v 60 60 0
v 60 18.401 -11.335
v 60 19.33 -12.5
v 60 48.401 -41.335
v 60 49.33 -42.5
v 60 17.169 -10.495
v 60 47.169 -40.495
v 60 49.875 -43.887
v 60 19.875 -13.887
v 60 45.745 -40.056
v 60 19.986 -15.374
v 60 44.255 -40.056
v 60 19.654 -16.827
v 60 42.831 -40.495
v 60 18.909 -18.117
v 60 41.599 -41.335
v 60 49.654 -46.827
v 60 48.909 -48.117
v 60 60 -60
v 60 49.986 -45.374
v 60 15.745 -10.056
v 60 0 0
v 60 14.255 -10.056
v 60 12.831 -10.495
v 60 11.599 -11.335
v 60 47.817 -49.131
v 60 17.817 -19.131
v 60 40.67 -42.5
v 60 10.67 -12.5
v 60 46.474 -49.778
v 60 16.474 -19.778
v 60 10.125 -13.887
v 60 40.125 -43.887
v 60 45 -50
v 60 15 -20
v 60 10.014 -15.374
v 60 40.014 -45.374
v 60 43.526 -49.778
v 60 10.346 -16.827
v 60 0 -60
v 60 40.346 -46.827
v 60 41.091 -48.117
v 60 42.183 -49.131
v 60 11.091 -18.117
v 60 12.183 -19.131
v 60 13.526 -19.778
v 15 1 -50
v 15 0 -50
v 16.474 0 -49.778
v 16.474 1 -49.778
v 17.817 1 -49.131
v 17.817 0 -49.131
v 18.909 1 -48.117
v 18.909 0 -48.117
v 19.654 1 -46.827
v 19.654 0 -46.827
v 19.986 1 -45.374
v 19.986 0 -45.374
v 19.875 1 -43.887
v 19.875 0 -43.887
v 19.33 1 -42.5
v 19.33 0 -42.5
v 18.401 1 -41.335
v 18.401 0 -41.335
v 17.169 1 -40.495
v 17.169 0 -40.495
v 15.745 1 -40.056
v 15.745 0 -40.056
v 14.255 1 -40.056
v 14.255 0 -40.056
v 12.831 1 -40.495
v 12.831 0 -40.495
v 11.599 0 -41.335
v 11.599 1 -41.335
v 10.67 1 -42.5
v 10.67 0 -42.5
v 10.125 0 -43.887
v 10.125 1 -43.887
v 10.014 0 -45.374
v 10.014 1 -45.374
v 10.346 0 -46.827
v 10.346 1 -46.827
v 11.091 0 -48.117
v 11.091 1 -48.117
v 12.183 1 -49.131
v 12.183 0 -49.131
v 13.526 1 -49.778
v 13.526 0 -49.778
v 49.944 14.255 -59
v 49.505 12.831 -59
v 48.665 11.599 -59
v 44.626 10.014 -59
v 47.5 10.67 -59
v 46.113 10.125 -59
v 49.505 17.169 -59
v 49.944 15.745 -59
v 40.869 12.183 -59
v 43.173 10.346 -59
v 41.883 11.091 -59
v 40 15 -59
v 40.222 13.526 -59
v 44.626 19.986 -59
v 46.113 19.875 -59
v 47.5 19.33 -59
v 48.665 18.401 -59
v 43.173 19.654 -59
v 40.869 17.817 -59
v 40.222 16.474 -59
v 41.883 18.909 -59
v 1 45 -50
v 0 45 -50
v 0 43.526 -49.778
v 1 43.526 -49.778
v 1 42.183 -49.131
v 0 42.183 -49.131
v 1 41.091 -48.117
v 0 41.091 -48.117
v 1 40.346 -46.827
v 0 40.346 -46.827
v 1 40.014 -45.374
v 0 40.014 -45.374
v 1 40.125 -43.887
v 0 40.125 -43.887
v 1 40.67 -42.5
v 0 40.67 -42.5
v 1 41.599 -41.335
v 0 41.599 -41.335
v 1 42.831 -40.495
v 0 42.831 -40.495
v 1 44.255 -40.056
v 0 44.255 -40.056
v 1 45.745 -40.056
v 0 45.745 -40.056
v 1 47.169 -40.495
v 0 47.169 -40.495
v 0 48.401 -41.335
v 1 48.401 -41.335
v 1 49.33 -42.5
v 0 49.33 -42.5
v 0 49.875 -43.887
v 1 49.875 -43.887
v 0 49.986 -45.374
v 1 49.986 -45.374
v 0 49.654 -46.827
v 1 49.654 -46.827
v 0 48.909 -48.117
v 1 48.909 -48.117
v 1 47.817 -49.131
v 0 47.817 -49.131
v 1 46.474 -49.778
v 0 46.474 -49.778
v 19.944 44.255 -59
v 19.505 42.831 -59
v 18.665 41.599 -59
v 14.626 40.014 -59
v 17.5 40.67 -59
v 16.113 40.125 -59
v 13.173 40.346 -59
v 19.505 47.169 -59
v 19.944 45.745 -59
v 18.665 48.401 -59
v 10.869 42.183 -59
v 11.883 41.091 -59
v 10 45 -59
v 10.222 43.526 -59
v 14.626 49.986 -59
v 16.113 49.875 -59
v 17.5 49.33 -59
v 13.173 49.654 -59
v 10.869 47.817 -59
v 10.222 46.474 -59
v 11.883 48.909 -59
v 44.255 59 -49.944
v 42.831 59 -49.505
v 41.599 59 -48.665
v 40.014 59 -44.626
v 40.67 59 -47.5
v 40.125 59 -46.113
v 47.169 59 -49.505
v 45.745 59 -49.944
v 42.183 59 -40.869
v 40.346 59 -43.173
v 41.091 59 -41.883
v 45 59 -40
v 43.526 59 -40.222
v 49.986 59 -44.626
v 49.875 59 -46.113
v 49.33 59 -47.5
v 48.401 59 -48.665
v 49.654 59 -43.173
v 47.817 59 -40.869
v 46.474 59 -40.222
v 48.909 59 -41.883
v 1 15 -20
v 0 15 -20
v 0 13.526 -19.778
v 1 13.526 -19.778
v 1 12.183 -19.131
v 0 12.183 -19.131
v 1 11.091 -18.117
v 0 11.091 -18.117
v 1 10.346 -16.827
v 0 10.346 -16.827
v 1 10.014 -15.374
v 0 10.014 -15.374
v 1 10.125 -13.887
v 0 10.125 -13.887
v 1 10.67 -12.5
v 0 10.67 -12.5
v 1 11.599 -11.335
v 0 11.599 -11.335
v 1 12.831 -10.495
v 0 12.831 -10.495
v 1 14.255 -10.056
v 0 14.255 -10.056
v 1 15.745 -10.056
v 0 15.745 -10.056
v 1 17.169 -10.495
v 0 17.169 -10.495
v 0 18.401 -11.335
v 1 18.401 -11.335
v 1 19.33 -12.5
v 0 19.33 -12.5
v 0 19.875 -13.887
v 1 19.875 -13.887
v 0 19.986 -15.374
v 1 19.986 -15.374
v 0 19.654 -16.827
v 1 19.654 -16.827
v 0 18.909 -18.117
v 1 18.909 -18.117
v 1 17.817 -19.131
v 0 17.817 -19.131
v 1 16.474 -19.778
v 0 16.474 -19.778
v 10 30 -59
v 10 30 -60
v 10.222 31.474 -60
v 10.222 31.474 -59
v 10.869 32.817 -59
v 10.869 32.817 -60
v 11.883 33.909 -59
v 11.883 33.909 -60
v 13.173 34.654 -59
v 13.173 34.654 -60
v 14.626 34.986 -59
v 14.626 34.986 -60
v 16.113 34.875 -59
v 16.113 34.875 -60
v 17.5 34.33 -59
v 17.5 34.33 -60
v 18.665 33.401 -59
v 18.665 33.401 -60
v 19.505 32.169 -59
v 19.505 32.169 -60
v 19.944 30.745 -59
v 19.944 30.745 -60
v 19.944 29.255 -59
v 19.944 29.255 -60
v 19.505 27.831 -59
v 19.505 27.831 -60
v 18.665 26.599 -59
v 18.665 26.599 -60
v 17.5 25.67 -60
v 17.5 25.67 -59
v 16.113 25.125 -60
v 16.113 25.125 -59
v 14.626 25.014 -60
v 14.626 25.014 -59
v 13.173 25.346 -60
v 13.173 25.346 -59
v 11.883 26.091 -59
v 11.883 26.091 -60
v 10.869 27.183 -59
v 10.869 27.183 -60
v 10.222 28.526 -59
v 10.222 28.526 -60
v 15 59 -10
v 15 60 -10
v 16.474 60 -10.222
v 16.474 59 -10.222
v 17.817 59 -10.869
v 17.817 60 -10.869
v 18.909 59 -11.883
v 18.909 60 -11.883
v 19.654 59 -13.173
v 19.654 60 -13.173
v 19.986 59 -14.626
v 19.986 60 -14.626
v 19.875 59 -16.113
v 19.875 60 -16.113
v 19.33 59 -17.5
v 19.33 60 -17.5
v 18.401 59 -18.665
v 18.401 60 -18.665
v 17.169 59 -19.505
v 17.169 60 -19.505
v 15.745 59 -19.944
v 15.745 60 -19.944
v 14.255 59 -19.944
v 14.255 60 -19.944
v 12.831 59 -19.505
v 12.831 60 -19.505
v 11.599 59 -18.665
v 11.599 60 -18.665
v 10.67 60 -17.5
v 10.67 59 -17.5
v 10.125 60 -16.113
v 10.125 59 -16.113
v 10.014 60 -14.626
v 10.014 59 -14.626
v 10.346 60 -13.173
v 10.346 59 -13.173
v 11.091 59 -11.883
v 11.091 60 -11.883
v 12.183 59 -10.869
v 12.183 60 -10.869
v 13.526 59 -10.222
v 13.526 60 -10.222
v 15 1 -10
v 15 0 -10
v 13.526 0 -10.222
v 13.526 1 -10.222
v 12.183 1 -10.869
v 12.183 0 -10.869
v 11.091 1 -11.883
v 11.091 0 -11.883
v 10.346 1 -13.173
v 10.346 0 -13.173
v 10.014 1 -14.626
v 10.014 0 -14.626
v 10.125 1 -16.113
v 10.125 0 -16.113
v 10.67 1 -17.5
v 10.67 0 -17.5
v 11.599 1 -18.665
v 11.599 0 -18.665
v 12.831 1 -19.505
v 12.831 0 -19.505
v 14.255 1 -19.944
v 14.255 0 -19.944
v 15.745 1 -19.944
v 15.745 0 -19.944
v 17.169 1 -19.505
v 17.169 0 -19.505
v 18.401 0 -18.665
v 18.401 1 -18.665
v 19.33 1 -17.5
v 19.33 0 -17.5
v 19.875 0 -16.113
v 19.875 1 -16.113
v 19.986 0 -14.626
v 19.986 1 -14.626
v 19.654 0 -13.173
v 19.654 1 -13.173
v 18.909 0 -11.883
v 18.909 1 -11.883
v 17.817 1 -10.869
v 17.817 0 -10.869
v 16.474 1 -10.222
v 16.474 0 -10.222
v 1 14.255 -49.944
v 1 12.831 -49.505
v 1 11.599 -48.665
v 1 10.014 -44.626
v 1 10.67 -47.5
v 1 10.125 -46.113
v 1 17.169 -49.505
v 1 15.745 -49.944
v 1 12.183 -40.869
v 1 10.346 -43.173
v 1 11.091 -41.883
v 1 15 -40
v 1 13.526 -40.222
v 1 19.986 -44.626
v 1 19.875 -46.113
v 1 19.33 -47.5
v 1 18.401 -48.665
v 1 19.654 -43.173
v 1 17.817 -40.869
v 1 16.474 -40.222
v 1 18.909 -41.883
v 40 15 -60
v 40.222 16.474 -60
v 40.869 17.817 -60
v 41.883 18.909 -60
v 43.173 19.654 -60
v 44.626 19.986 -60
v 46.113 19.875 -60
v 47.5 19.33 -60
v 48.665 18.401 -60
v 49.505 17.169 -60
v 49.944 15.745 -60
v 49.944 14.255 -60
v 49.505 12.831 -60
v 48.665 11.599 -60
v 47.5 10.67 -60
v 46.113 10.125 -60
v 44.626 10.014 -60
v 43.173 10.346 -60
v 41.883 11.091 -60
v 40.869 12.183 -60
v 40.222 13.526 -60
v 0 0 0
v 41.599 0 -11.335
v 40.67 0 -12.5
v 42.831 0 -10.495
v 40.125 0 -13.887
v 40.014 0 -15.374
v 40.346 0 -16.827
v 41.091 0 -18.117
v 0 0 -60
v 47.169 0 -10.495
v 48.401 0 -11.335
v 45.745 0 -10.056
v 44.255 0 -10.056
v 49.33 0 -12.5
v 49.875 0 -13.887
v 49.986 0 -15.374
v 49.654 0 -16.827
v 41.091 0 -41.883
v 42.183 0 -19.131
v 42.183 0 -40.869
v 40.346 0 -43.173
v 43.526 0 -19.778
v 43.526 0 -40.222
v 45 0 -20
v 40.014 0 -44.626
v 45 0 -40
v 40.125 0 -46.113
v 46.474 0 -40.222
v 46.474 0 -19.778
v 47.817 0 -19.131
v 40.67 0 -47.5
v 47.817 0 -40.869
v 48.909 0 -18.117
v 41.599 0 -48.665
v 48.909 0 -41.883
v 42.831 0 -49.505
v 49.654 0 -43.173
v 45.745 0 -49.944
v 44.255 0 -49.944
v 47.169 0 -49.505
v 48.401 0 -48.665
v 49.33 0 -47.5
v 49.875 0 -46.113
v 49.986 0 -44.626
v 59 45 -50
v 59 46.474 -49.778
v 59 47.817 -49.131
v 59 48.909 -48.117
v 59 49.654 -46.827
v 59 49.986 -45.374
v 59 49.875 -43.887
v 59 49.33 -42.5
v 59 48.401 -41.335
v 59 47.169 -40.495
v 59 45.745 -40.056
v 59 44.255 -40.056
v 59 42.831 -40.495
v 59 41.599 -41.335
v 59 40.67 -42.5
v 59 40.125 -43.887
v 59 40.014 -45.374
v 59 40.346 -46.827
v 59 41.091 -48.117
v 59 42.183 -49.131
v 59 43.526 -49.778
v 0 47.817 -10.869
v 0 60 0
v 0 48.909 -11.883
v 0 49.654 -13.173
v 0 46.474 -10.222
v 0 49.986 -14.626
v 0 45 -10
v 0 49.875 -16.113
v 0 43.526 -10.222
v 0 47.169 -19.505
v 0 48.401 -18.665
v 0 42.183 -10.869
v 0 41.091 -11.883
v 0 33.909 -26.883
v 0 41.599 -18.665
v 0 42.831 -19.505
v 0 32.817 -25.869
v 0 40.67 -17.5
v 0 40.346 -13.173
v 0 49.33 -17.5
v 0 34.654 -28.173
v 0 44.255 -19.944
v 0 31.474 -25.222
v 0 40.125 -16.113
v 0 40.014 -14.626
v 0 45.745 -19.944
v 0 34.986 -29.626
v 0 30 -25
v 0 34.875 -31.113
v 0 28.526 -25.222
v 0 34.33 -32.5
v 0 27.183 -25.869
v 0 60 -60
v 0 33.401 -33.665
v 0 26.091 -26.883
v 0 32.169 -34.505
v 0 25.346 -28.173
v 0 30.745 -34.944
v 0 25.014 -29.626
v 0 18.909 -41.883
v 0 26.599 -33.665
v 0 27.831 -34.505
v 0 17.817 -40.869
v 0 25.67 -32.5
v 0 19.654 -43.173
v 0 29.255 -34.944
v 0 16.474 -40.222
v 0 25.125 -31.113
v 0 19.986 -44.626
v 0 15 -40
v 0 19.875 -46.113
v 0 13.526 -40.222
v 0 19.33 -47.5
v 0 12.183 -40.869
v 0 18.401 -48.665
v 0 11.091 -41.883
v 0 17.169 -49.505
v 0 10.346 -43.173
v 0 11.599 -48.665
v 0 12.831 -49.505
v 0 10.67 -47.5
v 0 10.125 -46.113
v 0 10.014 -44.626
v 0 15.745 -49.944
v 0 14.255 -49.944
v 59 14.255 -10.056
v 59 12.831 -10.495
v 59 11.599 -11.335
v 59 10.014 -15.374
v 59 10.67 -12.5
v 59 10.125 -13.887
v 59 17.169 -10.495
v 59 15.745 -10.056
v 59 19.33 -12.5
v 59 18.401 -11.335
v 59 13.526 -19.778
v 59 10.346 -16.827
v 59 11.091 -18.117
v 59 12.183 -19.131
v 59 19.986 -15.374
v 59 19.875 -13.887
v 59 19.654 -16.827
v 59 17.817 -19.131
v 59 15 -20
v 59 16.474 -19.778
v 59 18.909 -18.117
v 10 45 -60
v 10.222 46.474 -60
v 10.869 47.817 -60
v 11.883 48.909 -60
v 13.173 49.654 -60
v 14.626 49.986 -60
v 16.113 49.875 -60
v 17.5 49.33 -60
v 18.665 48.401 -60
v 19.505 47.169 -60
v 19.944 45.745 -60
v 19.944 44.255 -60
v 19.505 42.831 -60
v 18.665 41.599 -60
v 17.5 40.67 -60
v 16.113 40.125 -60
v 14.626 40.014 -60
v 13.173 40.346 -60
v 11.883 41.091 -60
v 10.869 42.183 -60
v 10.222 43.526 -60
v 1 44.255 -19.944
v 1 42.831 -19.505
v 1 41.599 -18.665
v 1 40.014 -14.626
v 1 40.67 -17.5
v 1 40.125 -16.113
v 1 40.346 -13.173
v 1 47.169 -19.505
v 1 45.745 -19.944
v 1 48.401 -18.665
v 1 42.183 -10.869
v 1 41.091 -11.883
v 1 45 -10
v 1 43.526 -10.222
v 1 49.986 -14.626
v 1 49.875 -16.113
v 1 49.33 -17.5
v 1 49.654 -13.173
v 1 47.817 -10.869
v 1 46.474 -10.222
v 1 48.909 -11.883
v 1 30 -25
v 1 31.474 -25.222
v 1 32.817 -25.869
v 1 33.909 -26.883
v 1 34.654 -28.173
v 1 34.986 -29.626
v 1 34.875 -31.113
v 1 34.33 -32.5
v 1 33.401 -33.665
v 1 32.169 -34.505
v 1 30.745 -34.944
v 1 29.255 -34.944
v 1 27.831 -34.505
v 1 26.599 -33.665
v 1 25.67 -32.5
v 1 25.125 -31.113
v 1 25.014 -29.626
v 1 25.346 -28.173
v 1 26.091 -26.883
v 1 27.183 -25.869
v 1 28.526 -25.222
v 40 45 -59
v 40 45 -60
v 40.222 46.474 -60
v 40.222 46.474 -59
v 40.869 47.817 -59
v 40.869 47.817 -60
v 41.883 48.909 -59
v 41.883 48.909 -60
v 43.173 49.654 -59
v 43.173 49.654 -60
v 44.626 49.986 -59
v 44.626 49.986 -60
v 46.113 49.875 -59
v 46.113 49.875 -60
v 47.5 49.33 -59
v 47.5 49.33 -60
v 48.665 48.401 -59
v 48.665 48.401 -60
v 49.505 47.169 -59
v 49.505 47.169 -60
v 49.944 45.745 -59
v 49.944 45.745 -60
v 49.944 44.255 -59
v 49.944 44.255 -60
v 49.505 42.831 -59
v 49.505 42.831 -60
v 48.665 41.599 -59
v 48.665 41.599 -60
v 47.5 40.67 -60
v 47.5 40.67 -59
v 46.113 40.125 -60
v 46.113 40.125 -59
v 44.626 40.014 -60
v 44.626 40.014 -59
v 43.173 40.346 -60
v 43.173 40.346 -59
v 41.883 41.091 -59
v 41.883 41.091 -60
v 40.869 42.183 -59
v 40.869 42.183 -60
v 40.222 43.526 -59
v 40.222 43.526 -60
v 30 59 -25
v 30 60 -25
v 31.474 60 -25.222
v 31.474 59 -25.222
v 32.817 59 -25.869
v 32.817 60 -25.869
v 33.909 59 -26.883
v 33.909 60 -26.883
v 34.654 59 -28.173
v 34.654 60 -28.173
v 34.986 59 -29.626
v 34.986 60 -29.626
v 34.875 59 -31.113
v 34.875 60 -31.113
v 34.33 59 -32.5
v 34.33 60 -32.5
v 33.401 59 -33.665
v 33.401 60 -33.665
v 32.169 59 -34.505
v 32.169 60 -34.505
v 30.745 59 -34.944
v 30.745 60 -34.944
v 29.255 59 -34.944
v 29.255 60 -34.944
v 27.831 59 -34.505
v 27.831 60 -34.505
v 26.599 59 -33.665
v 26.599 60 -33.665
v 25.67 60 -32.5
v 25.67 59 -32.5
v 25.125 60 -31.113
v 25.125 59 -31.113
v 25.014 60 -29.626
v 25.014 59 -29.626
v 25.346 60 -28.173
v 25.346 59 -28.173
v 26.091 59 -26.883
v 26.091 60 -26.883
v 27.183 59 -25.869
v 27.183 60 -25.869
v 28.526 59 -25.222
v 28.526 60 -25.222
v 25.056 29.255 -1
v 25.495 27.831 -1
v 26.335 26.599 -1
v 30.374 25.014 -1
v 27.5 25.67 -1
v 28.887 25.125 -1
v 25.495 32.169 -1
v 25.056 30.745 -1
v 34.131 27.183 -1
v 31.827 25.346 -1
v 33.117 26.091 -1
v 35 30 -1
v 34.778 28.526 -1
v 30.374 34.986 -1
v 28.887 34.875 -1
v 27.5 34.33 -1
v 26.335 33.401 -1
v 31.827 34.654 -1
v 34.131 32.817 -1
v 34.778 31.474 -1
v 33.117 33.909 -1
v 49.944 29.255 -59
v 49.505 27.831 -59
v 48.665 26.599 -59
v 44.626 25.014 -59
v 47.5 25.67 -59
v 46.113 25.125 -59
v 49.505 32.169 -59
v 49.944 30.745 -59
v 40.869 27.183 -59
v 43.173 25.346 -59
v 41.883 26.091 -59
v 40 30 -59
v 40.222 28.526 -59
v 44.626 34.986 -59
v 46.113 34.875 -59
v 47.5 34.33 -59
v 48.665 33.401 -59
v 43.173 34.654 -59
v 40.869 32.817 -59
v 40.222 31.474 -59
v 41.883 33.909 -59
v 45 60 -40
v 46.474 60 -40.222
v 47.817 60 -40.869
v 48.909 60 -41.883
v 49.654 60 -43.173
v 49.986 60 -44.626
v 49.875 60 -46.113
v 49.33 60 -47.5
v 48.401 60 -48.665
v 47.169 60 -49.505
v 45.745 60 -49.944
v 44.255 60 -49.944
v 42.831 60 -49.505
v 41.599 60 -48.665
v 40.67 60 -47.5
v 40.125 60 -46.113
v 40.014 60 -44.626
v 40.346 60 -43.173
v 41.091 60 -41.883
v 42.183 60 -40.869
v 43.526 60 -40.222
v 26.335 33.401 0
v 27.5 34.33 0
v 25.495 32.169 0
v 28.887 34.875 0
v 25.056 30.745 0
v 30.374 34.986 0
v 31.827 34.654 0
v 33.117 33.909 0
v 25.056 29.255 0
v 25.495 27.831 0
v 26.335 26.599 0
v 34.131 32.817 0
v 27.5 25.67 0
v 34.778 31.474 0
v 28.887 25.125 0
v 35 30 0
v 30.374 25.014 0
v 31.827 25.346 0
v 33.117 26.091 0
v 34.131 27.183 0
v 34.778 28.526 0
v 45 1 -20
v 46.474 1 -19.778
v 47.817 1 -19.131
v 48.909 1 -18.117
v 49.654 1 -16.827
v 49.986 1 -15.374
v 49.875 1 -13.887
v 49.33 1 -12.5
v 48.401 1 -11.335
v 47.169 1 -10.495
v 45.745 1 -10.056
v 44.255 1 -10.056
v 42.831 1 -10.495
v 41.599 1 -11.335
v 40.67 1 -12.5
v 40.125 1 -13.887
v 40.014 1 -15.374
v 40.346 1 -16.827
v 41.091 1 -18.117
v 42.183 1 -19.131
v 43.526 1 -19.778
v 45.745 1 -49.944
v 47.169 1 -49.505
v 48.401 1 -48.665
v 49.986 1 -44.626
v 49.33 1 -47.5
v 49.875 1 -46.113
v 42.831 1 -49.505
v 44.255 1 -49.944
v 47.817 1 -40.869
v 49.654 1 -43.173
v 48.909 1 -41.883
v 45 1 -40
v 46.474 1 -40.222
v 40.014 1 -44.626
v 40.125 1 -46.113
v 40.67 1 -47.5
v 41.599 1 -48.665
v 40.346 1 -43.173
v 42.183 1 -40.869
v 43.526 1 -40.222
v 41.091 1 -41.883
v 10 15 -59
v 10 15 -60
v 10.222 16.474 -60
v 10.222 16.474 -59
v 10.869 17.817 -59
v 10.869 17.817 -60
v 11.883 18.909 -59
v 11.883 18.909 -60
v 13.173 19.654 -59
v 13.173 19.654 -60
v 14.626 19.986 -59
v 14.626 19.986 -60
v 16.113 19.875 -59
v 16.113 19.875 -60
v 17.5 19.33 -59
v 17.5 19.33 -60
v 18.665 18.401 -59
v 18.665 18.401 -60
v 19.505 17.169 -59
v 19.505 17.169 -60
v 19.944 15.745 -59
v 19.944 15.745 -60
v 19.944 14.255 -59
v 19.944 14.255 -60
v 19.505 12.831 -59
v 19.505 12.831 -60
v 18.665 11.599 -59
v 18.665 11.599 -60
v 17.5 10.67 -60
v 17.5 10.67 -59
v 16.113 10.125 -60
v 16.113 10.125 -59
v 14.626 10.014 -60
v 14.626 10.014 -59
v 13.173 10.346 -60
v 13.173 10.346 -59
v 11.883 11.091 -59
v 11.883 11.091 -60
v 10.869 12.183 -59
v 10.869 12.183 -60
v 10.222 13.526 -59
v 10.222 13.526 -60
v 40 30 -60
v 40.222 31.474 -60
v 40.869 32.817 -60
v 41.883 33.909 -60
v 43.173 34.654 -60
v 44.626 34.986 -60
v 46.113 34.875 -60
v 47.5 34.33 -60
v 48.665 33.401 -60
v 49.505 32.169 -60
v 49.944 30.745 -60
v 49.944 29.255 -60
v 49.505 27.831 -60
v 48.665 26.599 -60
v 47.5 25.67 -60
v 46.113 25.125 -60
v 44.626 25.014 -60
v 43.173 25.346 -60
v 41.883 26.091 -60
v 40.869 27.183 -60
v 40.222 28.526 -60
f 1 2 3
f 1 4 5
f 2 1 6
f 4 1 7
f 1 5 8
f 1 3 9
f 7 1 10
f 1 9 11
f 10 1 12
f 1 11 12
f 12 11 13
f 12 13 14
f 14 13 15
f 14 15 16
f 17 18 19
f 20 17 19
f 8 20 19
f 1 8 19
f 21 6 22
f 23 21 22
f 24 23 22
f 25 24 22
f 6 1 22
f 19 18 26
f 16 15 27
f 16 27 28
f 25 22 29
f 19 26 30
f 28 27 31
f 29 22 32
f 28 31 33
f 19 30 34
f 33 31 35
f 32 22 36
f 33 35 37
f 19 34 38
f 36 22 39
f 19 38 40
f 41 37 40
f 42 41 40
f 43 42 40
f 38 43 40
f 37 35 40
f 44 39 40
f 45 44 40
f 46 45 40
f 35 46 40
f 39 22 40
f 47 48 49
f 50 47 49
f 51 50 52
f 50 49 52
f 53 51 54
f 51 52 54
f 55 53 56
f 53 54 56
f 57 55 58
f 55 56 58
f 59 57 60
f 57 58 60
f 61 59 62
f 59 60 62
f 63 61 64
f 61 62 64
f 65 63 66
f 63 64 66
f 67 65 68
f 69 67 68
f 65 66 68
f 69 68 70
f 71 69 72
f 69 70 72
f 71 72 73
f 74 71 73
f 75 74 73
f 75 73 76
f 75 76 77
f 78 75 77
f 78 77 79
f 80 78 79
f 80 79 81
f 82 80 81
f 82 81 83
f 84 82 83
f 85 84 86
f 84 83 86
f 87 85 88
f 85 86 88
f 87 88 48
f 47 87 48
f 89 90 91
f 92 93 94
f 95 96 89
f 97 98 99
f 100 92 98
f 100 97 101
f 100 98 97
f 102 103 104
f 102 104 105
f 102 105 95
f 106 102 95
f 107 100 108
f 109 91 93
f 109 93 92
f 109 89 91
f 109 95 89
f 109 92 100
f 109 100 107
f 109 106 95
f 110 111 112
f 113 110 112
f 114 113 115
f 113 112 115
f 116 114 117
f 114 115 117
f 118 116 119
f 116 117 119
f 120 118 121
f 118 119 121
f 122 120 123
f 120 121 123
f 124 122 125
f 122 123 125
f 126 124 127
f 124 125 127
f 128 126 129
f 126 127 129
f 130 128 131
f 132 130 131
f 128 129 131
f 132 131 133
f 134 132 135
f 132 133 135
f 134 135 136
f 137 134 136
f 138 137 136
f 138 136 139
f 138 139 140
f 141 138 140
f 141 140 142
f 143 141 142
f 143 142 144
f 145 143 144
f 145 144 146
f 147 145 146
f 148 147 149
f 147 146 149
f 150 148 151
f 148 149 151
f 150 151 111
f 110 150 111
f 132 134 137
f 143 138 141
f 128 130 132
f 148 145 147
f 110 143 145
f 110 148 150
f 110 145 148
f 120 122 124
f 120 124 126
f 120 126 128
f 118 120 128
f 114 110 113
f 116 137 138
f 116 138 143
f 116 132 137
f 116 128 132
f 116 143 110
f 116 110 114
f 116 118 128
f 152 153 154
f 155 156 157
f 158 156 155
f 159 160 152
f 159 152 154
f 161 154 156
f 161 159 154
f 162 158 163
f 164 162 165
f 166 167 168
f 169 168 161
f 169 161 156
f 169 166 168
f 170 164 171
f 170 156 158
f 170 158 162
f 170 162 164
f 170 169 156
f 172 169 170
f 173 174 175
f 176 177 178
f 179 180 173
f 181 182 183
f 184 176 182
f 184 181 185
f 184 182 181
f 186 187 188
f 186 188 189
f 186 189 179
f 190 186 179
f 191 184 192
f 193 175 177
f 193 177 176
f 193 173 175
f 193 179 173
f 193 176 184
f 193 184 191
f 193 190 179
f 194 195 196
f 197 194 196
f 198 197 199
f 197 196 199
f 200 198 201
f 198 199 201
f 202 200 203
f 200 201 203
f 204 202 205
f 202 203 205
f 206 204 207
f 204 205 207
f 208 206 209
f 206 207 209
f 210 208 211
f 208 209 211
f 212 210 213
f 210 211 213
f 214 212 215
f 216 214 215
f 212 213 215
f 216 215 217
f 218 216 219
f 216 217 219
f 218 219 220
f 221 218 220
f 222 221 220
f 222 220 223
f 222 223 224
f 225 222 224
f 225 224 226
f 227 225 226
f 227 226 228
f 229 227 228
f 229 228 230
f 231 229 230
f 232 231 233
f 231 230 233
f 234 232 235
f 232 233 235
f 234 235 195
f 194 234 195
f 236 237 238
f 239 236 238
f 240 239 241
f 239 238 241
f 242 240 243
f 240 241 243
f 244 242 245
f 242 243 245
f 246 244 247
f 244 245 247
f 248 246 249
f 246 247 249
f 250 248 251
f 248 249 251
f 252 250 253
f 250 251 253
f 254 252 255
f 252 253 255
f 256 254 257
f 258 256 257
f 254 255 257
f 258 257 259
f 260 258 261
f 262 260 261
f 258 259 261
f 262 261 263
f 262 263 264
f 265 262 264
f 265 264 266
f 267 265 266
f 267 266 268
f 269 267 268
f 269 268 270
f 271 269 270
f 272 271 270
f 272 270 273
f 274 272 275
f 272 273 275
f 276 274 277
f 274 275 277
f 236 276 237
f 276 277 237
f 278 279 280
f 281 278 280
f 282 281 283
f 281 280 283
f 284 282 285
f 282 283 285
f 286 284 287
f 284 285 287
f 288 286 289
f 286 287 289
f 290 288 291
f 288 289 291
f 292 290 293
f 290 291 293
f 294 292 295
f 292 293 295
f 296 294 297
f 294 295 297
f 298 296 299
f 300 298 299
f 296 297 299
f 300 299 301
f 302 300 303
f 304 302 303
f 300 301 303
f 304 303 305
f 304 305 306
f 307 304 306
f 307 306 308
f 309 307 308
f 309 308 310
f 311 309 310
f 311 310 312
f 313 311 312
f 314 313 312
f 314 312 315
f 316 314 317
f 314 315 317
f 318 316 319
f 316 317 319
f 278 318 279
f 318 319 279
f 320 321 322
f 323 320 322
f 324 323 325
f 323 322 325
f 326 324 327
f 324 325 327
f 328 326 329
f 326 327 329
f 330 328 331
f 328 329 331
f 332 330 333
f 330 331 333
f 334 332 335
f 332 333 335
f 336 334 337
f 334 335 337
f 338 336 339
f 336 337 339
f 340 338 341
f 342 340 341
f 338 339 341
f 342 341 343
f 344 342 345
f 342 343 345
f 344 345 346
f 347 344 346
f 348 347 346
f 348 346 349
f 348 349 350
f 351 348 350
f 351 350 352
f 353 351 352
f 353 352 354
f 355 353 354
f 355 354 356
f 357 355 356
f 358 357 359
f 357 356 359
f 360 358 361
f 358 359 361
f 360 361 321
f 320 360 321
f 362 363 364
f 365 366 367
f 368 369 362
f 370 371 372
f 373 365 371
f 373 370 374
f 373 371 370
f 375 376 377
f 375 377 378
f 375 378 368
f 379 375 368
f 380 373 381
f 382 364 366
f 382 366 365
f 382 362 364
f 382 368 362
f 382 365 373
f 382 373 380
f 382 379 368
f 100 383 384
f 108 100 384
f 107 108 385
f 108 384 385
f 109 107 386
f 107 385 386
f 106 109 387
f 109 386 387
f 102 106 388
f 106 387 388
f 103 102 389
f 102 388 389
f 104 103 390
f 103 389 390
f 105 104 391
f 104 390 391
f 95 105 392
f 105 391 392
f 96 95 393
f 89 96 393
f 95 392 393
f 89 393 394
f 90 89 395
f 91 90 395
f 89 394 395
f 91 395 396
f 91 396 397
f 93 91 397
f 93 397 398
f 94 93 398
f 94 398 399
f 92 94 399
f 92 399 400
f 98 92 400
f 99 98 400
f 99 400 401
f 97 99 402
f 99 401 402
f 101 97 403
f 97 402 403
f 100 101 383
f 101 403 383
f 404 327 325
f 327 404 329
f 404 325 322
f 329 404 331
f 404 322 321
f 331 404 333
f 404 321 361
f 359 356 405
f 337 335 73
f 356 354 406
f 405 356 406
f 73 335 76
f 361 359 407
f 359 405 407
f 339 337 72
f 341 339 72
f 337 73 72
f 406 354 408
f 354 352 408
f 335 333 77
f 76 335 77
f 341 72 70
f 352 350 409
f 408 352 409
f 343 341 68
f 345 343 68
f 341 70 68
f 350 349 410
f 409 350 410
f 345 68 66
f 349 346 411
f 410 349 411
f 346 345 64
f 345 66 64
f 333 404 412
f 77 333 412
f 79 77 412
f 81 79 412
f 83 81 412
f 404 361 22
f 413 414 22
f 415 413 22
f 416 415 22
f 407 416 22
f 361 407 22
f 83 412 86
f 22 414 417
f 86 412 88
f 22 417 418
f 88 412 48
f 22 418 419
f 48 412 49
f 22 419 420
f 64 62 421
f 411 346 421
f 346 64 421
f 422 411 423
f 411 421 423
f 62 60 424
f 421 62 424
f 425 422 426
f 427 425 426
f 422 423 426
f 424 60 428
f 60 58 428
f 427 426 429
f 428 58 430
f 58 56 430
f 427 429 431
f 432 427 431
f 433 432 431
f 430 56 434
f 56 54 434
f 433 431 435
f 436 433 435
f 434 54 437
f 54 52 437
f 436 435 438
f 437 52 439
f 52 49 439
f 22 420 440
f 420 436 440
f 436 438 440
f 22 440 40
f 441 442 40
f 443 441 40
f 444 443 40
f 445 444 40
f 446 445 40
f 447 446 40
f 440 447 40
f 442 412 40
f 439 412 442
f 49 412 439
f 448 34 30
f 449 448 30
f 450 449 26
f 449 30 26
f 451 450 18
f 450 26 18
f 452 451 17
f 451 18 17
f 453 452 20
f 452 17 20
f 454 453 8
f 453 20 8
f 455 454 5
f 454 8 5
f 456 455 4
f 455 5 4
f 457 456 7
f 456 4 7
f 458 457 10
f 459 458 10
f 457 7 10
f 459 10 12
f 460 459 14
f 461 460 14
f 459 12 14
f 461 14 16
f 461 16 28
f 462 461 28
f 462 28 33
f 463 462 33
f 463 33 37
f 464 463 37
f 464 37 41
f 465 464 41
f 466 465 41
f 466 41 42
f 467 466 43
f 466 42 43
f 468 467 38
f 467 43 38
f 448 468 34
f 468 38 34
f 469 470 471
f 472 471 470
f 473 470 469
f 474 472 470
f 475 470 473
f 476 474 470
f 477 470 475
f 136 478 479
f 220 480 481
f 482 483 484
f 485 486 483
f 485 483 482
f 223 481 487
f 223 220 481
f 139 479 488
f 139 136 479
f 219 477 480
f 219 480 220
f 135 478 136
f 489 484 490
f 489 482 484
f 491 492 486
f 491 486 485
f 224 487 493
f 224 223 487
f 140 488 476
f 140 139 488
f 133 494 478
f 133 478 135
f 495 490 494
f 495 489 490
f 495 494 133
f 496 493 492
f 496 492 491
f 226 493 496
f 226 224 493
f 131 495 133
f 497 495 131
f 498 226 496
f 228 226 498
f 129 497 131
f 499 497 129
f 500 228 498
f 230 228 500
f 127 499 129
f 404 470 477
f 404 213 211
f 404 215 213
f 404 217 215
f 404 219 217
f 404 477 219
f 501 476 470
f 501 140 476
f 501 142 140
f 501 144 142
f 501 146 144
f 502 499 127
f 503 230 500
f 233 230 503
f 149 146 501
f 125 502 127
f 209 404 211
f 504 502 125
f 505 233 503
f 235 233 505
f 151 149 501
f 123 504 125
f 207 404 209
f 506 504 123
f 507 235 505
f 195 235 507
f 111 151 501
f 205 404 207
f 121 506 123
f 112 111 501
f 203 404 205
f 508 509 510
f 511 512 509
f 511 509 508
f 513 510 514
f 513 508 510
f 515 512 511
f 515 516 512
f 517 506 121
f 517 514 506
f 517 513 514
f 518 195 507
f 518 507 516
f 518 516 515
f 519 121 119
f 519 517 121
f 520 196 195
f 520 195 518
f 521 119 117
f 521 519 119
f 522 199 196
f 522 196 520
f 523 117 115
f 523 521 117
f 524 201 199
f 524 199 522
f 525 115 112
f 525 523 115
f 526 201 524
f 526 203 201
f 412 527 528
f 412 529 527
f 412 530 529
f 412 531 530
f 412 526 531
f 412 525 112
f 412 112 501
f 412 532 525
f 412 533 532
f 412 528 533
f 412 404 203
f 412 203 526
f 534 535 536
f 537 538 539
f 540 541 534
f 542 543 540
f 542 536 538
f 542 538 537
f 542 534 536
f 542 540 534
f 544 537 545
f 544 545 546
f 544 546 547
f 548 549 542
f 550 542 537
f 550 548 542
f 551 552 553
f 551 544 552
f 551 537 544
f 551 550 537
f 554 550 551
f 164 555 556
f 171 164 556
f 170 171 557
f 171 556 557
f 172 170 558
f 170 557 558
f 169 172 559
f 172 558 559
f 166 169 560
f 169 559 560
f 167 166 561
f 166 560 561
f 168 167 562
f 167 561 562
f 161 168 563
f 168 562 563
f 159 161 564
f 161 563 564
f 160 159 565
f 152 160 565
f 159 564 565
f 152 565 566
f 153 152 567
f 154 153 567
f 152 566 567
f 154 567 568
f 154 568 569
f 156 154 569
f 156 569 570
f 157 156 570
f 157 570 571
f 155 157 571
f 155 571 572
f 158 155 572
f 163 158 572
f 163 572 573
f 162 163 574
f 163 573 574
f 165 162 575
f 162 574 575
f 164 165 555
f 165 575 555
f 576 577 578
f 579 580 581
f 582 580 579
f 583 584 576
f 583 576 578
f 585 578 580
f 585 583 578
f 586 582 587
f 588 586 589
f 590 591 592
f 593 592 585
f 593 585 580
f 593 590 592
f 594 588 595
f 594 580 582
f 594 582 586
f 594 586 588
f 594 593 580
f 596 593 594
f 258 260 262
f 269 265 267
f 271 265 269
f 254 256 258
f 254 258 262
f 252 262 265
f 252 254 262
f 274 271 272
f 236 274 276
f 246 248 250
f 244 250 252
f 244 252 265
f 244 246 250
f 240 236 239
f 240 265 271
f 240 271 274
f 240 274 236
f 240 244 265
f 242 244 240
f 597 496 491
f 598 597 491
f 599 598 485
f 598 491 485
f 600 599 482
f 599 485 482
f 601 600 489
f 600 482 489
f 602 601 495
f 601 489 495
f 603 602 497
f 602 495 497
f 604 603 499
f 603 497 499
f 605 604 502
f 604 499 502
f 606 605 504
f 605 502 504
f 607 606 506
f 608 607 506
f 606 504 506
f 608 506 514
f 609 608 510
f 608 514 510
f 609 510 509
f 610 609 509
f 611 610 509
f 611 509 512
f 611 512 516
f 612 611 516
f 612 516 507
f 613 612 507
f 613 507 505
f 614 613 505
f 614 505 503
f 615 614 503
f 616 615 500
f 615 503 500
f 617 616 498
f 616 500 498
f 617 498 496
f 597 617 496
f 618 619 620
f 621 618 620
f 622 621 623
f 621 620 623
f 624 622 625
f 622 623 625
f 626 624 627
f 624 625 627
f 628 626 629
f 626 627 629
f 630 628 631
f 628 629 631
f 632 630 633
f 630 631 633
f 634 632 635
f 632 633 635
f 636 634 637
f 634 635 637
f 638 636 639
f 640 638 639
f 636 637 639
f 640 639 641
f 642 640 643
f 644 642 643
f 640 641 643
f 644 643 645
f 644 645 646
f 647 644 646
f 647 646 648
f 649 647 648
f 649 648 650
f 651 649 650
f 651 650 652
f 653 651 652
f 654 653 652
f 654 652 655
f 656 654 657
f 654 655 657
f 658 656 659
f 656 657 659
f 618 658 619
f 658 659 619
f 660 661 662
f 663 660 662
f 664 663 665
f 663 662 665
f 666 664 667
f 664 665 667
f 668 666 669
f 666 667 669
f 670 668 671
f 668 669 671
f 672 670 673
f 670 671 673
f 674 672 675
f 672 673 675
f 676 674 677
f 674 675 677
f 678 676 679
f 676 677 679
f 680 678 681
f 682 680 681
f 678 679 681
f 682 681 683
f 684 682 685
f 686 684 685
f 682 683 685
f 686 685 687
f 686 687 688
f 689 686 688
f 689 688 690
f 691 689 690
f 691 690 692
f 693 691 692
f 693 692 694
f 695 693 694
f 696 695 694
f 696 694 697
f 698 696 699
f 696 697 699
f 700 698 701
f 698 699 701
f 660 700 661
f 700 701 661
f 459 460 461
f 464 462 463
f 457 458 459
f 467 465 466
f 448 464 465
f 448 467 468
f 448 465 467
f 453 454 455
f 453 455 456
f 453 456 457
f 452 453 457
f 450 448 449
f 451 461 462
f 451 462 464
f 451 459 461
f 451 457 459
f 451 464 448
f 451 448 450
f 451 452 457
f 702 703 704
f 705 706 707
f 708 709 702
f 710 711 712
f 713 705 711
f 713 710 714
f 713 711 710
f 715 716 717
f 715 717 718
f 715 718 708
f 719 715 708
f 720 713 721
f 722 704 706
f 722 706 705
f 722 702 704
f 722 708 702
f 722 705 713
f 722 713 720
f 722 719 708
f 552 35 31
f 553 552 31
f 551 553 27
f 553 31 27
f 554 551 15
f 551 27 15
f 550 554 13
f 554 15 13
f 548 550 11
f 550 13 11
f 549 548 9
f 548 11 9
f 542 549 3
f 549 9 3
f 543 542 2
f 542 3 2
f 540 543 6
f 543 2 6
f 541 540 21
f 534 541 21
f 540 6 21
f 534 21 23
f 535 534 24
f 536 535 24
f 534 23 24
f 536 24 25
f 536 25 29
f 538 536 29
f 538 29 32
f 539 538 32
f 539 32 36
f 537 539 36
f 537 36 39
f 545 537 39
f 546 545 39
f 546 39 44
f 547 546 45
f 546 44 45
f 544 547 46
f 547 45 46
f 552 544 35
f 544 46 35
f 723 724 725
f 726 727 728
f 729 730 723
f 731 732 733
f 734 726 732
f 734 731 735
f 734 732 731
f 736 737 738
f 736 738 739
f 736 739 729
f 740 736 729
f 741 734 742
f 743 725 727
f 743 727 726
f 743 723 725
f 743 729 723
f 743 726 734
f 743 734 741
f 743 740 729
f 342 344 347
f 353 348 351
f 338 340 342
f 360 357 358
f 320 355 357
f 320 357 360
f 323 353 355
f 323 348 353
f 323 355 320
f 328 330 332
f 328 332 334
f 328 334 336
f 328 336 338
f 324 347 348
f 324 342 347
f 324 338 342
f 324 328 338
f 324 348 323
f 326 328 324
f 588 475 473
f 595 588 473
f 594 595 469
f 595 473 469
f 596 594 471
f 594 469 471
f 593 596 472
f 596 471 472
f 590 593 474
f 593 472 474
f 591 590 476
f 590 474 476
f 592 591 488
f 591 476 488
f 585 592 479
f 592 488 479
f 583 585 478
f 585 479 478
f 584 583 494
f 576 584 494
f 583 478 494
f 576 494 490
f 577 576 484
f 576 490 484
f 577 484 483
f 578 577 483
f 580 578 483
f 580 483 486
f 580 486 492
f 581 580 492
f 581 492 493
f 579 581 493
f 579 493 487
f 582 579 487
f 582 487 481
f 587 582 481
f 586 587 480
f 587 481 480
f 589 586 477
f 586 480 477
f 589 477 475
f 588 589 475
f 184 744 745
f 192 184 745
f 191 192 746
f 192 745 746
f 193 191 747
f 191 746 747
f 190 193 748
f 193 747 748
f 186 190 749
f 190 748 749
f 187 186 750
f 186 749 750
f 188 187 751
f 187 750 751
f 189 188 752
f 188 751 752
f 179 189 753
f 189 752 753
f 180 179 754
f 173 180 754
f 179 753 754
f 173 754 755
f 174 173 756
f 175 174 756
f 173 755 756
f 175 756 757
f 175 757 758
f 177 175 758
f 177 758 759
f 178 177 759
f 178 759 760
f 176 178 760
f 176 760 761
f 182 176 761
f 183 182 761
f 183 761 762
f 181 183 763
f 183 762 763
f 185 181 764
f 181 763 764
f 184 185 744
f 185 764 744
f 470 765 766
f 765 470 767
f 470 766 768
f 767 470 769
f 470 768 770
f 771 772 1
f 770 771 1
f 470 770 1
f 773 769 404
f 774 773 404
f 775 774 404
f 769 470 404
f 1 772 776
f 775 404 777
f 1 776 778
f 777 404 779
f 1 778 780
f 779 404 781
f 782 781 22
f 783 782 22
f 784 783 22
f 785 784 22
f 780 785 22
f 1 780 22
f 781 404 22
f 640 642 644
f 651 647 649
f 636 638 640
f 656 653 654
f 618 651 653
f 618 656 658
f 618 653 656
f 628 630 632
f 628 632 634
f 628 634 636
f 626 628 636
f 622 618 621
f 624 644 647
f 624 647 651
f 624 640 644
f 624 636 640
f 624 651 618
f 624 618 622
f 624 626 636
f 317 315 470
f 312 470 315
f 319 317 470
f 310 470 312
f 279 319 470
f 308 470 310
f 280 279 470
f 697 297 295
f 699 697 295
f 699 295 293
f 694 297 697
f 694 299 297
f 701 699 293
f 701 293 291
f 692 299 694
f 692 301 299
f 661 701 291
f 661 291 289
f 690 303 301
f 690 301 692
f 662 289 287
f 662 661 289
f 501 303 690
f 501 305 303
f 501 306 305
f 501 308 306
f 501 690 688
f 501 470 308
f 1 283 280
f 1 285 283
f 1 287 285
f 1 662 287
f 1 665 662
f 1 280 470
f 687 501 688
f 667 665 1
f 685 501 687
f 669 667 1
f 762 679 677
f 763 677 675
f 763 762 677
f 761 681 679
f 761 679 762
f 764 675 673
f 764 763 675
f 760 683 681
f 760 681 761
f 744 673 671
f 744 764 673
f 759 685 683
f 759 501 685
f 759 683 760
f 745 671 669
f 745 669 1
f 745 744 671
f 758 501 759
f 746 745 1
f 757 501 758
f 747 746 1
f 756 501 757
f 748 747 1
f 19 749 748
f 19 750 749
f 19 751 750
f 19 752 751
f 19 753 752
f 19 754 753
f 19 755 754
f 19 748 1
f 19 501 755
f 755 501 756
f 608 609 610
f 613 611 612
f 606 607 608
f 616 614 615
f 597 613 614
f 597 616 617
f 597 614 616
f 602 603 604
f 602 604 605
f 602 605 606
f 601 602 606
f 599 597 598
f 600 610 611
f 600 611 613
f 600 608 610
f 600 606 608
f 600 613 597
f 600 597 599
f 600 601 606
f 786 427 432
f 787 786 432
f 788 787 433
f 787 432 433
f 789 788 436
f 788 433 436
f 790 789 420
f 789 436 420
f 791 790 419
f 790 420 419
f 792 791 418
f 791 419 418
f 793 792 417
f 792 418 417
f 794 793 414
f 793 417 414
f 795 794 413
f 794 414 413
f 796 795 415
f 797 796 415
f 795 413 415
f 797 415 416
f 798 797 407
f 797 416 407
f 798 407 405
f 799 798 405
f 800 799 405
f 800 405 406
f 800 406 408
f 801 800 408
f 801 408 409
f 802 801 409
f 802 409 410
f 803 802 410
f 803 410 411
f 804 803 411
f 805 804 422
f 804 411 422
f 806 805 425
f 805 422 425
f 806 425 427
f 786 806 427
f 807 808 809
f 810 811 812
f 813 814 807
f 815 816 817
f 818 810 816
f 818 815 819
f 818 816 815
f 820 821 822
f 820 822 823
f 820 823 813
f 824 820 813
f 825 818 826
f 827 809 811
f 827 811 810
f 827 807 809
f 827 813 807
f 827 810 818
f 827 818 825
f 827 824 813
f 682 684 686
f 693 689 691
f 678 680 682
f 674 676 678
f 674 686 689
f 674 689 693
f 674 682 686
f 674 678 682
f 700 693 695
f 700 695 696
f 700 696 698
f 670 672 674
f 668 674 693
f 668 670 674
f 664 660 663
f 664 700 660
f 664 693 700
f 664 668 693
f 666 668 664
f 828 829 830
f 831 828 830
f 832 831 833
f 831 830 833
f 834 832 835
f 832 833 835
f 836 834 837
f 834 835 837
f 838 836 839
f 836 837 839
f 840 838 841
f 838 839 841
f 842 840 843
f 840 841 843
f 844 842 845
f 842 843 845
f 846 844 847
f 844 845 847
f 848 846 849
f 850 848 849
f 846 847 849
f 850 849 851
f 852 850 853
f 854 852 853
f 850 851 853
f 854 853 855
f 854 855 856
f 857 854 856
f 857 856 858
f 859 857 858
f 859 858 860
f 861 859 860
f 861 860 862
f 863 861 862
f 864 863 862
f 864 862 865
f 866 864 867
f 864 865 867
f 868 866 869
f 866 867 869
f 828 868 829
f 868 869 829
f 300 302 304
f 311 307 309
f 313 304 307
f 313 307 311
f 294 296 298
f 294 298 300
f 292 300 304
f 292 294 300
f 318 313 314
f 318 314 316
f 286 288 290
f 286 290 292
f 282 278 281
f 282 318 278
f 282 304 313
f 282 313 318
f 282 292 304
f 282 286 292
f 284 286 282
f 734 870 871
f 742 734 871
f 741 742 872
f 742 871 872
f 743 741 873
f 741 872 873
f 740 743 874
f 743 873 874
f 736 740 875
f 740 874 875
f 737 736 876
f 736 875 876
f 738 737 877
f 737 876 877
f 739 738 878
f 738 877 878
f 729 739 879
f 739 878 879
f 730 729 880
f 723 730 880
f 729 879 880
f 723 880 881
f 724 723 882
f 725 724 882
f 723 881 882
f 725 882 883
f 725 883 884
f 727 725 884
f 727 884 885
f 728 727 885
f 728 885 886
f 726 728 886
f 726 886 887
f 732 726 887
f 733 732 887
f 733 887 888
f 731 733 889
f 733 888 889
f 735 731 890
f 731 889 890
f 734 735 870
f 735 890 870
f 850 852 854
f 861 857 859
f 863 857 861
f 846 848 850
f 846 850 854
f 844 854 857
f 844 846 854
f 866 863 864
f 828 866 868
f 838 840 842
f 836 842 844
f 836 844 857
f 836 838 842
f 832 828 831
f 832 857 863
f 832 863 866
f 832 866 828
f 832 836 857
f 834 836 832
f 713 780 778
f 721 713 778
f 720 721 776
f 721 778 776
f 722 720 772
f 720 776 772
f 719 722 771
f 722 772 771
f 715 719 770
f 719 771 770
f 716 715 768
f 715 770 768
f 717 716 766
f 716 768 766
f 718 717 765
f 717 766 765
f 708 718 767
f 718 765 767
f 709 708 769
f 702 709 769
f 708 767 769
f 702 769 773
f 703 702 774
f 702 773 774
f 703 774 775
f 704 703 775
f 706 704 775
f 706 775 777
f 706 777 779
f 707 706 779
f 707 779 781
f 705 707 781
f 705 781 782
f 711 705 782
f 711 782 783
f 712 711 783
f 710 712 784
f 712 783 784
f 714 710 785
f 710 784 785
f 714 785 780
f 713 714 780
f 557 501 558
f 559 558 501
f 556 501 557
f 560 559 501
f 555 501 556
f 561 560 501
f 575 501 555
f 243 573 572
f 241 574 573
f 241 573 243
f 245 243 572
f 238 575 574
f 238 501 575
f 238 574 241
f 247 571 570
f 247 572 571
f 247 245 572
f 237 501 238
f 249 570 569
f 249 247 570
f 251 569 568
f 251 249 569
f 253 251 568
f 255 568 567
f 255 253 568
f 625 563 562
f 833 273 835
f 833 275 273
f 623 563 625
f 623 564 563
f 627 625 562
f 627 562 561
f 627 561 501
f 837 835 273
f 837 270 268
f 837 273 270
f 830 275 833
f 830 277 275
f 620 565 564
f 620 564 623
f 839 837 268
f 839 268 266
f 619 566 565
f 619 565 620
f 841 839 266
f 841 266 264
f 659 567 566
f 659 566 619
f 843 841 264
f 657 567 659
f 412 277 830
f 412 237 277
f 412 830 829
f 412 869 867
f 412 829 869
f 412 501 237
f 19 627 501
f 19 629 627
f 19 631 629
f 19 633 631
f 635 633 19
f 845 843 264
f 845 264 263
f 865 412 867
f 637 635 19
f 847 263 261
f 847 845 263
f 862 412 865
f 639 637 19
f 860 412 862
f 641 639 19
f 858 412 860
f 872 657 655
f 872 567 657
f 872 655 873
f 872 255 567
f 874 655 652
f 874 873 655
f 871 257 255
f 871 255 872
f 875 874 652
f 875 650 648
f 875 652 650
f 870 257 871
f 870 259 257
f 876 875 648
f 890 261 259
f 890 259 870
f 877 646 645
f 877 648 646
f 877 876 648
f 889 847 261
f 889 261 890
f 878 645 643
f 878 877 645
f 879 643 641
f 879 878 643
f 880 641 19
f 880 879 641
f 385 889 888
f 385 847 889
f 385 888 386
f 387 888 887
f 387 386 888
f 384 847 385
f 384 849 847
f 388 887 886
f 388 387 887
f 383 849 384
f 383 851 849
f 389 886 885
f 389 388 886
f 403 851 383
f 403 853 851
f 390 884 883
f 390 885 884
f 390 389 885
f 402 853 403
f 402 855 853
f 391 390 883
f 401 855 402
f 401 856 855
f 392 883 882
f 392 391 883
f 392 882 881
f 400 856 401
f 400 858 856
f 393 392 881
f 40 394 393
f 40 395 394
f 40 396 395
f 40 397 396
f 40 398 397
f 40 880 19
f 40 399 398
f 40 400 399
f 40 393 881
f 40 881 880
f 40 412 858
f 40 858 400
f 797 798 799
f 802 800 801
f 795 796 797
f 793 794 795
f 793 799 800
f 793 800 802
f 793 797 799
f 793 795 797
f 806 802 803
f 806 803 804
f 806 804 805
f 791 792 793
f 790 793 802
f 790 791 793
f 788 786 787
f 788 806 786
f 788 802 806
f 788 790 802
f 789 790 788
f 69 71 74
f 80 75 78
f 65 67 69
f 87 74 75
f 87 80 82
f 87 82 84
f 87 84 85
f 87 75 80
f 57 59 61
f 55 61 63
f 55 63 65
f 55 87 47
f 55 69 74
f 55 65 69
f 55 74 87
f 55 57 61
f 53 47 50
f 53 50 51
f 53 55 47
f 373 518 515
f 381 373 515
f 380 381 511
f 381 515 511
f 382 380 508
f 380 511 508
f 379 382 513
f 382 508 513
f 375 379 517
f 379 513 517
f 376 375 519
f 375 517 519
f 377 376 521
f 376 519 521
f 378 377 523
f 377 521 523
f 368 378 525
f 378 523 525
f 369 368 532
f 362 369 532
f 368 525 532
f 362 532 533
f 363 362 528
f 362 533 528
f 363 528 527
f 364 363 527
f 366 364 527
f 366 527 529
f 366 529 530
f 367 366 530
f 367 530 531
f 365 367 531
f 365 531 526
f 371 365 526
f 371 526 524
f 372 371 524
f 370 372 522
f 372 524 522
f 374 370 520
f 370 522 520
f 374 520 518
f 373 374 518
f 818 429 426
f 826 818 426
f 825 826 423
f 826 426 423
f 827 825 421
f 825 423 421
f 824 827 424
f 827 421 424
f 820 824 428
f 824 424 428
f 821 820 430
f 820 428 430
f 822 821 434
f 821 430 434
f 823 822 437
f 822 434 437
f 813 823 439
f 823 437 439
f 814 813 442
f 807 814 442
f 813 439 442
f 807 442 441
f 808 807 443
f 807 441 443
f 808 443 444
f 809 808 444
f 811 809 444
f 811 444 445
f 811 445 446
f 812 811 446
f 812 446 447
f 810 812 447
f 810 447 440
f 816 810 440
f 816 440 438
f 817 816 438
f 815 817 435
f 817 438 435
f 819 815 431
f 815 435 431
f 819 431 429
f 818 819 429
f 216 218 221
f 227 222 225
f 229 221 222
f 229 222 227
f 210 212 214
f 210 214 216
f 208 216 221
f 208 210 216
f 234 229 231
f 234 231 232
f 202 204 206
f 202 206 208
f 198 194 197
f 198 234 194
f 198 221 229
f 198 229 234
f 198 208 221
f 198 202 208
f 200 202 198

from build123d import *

# Parameters (mm, degrees)
SKETCH1_W          = 60
SKETCH1_H          = 60
EXTRUDE1_DEPTH     = 60
SKETCH2_R          = 5
CUT_EXTRUDE1_DEPTH = 1
SKETCH3_R          = 5
CUT_EXTRUDE2_DEPTH = 1
SKETCH4_R          = 5
CUT_EXTRUDE3_DEPTH = 1
SKETCH5_R          = 5
CUT_EXTRUDE4_DEPTH = 1
SKETCH6_R          = 5
CUT_EXTRUDE5_DEPTH = 1
SKETCH7_R          = 5
CUT_EXTRUDE6_DEPTH = 1


with BuildPart() as part:
    # Sketch1 → Extrude1 (new body)
    with BuildSketch(Plane(origin=(0, 0, 0), x_dir=(1, 0, 0), z_dir=(0, 1, 0))):
        with Locations((30, 30)):
            Rectangle(SKETCH1_W, SKETCH1_H)
    extrude(amount=EXTRUDE1_DEPTH)

    # Sketch2 → Cut-Extrude1 (cut)
    with BuildSketch(Plane(origin=(0, 60, 0), x_dir=(-1, 0, 0), z_dir=(0, 1, 0))):
        with Locations(Location((-45, -45, 0), (0, 0, 90))):  # turned: the seam where the file's is
            Circle(SKETCH2_R)
        with Locations(Location((-30, -30, 0), (0, 0, 90))):  # turned: the seam where the file's is
            Circle(SKETCH2_R)
        with Locations(Location((-15, -15, 0), (0, 0, 90))):  # turned: the seam where the file's is
            Circle(SKETCH2_R)
    extrude(amount=-CUT_EXTRUDE1_DEPTH, mode=Mode.SUBTRACT)

    # Sketch3 → Cut-Extrude2 (cut)
    with BuildSketch(Plane(origin=(60, 0, 0), x_dir=(0, 0, -1), z_dir=(1, 0, 0))):
        with Locations((45, 45)):
            Circle(SKETCH3_R)
        with Locations((15, 15)):
            Circle(SKETCH3_R)
    extrude(amount=-CUT_EXTRUDE2_DEPTH, mode=Mode.SUBTRACT)

    # Sketch4 → Cut-Extrude3 (cut)
    with BuildSketch(Plane.XY):
        with Locations((30, 30)):
            Circle(SKETCH4_R)
    extrude(amount=-CUT_EXTRUDE3_DEPTH, mode=Mode.SUBTRACT)

    # Sketch5 → Cut-Extrude4 (cut)
    with BuildSketch(Plane(origin=(0, 0, -60), x_dir=(-1, 0, 0), z_dir=(0, 0, -1))):
        with Locations((-15, 45)):
            Circle(SKETCH5_R)
        with Locations((-15, 30)):
            Circle(SKETCH5_R)
        with Locations((-15, 15)):
            Circle(SKETCH5_R)
        with Locations((-45, 45)):
            Circle(SKETCH5_R)
        with Locations((-45, 30)):
            Circle(SKETCH5_R)
        with Locations((-45, 15)):
            Circle(SKETCH5_R)
    extrude(amount=-CUT_EXTRUDE4_DEPTH, mode=Mode.SUBTRACT)

    # Sketch6 → Cut-Extrude5 (cut)
    with BuildSketch(Plane.ZY):
        with Locations((-30, 30)):
            Circle(SKETCH6_R)
        with Locations(Location((-45, 45, 0), (0, 0, 180))):  # turned: the seam where the file's is
            Circle(SKETCH6_R)
        with Locations((-15, 45)):
            Circle(SKETCH6_R)
        with Locations((-45, 15)):
            Circle(SKETCH6_R)
        with Locations(Location((-15, 15, 0), (0, 0, 180))):  # turned: the seam where the file's is
            Circle(SKETCH6_R)
    extrude(amount=-CUT_EXTRUDE5_DEPTH, mode=Mode.SUBTRACT)

    # Sketch7 → Cut-Extrude6 (cut)
    with BuildSketch(Plane.XZ):
        with Locations(Location((15, -45, 0), (0, 0, 270))):  # turned: the seam where the file's is
            Circle(SKETCH7_R)
        with Locations(Location((15, -15, 0), (0, 0, 90))):  # turned: the seam where the file's is
            Circle(SKETCH7_R)
        with Locations(Location((45, -45, 0), (0, 0, 90))):  # turned: the seam where the file's is
            Circle(SKETCH7_R)
        with Locations(Location((45, -15, 0), (0, 0, 270))):  # turned: the seam where the file's is
            Circle(SKETCH7_R)
    extrude(amount=-CUT_EXTRUDE6_DEPTH, mode=Mode.SUBTRACT)


solid = part.part
